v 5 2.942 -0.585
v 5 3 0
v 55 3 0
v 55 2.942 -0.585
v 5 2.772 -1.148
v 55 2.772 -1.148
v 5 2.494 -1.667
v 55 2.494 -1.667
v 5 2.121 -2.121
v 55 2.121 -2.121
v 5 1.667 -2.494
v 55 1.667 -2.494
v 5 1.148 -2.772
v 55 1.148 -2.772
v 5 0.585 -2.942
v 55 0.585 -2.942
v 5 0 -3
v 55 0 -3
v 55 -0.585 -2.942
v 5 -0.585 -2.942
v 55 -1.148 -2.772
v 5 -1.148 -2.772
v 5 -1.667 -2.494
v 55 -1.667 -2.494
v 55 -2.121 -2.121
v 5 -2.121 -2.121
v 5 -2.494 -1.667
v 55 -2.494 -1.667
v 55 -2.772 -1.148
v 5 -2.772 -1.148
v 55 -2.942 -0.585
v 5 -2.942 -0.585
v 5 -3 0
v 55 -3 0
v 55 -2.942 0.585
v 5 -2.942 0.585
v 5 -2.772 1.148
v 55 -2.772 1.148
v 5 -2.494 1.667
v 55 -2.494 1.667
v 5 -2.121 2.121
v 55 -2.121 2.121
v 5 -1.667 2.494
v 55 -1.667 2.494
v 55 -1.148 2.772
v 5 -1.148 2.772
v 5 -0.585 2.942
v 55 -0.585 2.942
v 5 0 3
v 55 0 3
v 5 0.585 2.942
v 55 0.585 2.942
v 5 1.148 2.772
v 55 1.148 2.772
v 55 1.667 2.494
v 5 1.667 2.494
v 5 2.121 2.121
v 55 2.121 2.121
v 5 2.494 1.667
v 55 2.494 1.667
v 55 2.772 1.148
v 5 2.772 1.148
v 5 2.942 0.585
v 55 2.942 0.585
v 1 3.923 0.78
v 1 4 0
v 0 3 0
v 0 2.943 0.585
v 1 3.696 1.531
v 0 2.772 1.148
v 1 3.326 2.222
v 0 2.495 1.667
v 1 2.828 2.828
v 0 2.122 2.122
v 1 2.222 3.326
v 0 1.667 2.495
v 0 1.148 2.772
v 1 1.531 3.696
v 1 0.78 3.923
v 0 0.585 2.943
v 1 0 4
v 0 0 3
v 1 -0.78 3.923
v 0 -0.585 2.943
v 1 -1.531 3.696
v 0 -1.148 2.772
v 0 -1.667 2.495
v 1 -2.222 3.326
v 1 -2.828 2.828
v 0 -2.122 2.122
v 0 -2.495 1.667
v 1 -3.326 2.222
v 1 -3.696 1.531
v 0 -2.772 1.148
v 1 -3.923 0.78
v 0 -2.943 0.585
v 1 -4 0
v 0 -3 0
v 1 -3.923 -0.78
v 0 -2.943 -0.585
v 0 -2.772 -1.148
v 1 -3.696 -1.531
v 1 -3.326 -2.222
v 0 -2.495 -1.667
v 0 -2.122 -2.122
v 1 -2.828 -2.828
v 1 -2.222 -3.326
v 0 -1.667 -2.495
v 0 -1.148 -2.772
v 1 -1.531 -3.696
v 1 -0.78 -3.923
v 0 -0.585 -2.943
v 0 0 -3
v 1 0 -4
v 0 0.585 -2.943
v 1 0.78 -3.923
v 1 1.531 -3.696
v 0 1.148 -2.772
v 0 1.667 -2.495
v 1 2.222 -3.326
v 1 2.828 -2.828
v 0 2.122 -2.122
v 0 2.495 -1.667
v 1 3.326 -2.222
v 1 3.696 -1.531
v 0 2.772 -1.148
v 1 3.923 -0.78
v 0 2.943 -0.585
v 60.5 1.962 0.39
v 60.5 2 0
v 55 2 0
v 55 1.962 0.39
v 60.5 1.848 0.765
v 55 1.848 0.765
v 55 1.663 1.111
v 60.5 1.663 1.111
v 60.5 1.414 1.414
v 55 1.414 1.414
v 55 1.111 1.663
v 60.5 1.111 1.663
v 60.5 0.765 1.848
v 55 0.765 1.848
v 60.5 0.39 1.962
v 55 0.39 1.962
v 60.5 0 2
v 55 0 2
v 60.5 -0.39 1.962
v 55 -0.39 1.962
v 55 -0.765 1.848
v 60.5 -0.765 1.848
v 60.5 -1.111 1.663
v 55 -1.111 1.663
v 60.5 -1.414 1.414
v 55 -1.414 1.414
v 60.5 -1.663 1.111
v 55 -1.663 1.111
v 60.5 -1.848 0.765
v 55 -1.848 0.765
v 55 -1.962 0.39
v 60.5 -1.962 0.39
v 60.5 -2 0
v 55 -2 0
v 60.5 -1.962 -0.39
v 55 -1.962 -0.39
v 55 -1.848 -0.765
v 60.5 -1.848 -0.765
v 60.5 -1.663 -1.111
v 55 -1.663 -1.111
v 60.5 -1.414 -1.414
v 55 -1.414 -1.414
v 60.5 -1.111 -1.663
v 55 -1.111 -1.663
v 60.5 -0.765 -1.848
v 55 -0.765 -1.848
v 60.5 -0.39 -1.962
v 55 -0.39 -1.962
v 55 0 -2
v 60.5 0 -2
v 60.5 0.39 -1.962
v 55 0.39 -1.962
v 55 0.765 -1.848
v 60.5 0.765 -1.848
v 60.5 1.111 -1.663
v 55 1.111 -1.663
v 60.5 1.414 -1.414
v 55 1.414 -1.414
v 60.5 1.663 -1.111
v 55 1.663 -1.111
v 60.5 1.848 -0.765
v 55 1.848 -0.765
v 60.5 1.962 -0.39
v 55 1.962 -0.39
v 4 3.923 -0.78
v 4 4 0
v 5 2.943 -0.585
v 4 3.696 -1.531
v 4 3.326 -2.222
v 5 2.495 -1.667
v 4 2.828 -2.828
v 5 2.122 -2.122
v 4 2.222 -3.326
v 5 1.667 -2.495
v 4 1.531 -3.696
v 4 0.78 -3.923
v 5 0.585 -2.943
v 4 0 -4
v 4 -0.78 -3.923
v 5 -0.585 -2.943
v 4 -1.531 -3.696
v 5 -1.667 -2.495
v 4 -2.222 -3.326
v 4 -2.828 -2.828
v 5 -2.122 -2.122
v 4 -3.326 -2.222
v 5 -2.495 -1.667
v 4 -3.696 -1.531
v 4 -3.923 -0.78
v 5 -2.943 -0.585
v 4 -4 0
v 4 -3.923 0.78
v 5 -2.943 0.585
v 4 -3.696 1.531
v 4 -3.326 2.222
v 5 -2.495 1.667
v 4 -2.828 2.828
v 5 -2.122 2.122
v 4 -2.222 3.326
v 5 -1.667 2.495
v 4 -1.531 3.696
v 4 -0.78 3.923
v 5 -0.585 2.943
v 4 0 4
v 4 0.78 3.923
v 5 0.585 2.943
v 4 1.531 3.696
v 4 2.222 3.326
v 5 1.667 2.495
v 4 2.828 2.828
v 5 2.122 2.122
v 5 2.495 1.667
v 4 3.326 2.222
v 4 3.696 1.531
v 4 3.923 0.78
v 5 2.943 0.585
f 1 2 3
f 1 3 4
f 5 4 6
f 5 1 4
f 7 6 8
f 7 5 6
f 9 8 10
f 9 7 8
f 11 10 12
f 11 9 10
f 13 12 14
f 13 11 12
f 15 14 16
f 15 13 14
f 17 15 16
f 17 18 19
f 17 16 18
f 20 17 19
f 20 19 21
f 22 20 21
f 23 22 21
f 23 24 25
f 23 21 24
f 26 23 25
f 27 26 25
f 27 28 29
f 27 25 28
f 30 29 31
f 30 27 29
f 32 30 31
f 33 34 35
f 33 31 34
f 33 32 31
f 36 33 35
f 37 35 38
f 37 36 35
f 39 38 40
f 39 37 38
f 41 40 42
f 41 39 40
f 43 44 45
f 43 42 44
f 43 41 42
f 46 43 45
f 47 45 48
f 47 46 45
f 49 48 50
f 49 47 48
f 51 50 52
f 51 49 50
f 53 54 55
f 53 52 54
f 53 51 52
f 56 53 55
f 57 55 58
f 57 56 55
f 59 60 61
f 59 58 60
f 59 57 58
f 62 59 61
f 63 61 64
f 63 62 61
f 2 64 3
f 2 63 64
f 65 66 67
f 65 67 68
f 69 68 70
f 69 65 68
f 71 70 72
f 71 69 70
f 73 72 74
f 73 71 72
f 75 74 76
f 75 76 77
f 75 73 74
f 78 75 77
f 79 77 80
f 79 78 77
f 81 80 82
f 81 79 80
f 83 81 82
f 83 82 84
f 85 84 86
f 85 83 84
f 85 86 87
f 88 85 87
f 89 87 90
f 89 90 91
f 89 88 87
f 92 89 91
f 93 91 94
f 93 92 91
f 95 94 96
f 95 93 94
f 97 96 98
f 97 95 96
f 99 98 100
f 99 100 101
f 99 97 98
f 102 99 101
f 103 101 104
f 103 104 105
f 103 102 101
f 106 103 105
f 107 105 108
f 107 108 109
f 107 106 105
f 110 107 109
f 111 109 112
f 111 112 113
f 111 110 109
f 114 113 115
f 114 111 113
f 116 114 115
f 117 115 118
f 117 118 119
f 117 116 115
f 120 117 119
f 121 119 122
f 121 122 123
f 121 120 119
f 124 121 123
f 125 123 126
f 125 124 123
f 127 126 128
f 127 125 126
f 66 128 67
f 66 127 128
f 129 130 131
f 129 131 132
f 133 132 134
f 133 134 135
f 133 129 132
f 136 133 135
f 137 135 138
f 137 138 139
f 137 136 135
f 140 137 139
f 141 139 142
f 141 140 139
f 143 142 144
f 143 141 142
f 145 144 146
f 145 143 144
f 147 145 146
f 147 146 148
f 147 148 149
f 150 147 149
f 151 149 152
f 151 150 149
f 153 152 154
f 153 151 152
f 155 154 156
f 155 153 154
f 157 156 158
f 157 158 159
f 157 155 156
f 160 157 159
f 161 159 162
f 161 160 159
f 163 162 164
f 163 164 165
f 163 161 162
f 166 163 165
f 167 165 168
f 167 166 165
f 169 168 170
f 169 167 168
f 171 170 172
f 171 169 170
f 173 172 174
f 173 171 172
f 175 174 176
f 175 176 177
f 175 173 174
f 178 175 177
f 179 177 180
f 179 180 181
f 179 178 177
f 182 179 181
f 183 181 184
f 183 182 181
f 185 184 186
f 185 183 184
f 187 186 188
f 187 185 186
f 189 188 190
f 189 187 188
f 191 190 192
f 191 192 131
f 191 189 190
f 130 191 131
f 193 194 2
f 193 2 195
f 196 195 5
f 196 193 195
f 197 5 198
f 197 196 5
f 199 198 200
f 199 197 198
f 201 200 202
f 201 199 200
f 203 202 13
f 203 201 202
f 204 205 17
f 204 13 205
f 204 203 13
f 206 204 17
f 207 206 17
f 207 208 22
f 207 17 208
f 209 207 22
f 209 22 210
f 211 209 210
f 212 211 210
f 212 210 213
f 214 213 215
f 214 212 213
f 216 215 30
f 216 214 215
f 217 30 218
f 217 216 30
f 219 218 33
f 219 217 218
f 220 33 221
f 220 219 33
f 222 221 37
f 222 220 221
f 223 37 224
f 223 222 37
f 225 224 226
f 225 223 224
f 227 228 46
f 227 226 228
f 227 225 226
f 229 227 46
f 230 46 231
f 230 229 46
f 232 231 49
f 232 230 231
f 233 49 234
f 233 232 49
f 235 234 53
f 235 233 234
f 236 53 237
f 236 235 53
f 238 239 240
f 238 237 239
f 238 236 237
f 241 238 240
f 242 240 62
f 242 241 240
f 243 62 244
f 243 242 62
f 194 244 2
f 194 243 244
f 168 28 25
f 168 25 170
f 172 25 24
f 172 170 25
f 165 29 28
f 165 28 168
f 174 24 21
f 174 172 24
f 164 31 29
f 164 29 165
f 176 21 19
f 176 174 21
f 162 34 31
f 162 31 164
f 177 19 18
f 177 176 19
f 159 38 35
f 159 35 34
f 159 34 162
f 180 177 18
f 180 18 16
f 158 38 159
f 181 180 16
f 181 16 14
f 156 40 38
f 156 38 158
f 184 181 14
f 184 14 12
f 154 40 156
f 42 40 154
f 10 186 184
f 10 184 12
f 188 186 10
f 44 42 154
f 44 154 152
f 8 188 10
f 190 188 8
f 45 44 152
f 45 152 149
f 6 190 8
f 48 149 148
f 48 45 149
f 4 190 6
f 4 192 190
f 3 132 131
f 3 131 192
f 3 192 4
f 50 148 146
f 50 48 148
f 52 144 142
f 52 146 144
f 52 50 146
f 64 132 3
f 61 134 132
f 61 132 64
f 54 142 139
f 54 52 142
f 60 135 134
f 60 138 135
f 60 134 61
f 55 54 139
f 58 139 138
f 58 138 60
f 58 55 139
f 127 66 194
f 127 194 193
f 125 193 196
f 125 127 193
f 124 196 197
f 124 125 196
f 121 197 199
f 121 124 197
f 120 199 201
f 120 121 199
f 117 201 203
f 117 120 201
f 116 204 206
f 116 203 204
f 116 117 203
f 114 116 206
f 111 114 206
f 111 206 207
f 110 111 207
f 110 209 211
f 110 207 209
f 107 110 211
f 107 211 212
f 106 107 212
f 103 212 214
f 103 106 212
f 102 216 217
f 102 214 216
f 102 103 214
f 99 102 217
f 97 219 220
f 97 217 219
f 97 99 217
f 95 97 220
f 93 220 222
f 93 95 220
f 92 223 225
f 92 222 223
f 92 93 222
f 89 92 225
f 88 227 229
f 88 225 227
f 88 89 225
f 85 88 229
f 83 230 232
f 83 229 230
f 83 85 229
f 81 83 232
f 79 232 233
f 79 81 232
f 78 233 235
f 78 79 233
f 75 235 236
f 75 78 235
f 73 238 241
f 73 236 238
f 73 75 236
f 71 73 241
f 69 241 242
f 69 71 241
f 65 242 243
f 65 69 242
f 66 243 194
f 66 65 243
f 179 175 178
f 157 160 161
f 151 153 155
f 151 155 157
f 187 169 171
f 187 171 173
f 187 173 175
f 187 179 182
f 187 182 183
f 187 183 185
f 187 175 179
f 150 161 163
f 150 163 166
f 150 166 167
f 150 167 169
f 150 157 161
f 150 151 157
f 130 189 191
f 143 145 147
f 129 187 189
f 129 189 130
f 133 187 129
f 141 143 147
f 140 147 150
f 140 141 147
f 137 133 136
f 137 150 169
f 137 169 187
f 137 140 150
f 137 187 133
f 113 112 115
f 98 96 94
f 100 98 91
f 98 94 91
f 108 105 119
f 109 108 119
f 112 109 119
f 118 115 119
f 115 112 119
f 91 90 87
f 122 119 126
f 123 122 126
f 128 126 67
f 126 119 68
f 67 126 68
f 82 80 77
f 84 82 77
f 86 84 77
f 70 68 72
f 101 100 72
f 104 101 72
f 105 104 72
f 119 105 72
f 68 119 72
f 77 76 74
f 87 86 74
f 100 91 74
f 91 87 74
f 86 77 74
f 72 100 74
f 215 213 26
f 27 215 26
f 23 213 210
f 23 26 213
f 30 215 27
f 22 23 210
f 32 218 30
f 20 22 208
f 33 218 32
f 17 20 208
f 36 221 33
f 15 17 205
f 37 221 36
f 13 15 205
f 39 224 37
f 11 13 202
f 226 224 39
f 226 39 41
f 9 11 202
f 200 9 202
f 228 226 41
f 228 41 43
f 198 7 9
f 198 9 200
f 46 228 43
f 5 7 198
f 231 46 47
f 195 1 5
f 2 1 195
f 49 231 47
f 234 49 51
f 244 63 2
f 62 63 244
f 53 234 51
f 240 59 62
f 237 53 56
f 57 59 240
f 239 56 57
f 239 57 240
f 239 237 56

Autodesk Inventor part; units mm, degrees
ref_plane "YZ Plane" through (0, 0, 0) normal (1, 0, 0) x (0, 1, 0)
ref_plane "XZ Plane" through (0, 0, 0) normal (0, 1, 0) x (-1, 0, 0)
ref_plane "XY Plane" through (0, 0, 0) normal (0, 0, 1) x (1, 0, 0)
sketch "Sketch1" plane through (0, 0, 0) normal (0, 0, 1) x (1, 0, 0)
  line L0 (0, 0) -> (60.5, 0)
  line L1 (60.5, 0) -> (60.5, 3)
  line L2 (60.5, 3) -> (0, 3)
  line L3 (0, 3) -> (0, 0)
  line L4 (60.5, 0) -> (55, 0)
  line L5 (55, 0) -> (55, 2)
  line L6 (55, 2) -> (60.5, 2)
  line L7 (60.5, 2) -> (60.5, 0)
  line L8 (55, 2) -> (55, 3)
  line L9 (0, 0) -> (5, 0)
  line L10 (5, 0) -> (5, 4)
  line L11 (5, 4) -> (0, 4)
  line L12 (0, 4) -> (0, 0)
  point P0 (5, 3)
  dimension "d0" = 60.5
  dimension "d1" = 3
  dimension "d2" = 5.5
  dimension "d3" = 2
  dimension "d4" = 5
  dimension "d5" = 4
revolve "Revolution1" add sketch "Sketch1" angle 360 about axis through (0, 0, 0) along (1, 0, 0) contours L3 L2 L10 L0 | L10 L2 L8 L5 L0 | L12 L11 L10 L2 | L5 L6 L1 L0
chamfer "Chamfer1" distance 1 angle 45 2 edges at (5, -4, 0) (0, -4, 0)
properties part number "Hajtókar1"
